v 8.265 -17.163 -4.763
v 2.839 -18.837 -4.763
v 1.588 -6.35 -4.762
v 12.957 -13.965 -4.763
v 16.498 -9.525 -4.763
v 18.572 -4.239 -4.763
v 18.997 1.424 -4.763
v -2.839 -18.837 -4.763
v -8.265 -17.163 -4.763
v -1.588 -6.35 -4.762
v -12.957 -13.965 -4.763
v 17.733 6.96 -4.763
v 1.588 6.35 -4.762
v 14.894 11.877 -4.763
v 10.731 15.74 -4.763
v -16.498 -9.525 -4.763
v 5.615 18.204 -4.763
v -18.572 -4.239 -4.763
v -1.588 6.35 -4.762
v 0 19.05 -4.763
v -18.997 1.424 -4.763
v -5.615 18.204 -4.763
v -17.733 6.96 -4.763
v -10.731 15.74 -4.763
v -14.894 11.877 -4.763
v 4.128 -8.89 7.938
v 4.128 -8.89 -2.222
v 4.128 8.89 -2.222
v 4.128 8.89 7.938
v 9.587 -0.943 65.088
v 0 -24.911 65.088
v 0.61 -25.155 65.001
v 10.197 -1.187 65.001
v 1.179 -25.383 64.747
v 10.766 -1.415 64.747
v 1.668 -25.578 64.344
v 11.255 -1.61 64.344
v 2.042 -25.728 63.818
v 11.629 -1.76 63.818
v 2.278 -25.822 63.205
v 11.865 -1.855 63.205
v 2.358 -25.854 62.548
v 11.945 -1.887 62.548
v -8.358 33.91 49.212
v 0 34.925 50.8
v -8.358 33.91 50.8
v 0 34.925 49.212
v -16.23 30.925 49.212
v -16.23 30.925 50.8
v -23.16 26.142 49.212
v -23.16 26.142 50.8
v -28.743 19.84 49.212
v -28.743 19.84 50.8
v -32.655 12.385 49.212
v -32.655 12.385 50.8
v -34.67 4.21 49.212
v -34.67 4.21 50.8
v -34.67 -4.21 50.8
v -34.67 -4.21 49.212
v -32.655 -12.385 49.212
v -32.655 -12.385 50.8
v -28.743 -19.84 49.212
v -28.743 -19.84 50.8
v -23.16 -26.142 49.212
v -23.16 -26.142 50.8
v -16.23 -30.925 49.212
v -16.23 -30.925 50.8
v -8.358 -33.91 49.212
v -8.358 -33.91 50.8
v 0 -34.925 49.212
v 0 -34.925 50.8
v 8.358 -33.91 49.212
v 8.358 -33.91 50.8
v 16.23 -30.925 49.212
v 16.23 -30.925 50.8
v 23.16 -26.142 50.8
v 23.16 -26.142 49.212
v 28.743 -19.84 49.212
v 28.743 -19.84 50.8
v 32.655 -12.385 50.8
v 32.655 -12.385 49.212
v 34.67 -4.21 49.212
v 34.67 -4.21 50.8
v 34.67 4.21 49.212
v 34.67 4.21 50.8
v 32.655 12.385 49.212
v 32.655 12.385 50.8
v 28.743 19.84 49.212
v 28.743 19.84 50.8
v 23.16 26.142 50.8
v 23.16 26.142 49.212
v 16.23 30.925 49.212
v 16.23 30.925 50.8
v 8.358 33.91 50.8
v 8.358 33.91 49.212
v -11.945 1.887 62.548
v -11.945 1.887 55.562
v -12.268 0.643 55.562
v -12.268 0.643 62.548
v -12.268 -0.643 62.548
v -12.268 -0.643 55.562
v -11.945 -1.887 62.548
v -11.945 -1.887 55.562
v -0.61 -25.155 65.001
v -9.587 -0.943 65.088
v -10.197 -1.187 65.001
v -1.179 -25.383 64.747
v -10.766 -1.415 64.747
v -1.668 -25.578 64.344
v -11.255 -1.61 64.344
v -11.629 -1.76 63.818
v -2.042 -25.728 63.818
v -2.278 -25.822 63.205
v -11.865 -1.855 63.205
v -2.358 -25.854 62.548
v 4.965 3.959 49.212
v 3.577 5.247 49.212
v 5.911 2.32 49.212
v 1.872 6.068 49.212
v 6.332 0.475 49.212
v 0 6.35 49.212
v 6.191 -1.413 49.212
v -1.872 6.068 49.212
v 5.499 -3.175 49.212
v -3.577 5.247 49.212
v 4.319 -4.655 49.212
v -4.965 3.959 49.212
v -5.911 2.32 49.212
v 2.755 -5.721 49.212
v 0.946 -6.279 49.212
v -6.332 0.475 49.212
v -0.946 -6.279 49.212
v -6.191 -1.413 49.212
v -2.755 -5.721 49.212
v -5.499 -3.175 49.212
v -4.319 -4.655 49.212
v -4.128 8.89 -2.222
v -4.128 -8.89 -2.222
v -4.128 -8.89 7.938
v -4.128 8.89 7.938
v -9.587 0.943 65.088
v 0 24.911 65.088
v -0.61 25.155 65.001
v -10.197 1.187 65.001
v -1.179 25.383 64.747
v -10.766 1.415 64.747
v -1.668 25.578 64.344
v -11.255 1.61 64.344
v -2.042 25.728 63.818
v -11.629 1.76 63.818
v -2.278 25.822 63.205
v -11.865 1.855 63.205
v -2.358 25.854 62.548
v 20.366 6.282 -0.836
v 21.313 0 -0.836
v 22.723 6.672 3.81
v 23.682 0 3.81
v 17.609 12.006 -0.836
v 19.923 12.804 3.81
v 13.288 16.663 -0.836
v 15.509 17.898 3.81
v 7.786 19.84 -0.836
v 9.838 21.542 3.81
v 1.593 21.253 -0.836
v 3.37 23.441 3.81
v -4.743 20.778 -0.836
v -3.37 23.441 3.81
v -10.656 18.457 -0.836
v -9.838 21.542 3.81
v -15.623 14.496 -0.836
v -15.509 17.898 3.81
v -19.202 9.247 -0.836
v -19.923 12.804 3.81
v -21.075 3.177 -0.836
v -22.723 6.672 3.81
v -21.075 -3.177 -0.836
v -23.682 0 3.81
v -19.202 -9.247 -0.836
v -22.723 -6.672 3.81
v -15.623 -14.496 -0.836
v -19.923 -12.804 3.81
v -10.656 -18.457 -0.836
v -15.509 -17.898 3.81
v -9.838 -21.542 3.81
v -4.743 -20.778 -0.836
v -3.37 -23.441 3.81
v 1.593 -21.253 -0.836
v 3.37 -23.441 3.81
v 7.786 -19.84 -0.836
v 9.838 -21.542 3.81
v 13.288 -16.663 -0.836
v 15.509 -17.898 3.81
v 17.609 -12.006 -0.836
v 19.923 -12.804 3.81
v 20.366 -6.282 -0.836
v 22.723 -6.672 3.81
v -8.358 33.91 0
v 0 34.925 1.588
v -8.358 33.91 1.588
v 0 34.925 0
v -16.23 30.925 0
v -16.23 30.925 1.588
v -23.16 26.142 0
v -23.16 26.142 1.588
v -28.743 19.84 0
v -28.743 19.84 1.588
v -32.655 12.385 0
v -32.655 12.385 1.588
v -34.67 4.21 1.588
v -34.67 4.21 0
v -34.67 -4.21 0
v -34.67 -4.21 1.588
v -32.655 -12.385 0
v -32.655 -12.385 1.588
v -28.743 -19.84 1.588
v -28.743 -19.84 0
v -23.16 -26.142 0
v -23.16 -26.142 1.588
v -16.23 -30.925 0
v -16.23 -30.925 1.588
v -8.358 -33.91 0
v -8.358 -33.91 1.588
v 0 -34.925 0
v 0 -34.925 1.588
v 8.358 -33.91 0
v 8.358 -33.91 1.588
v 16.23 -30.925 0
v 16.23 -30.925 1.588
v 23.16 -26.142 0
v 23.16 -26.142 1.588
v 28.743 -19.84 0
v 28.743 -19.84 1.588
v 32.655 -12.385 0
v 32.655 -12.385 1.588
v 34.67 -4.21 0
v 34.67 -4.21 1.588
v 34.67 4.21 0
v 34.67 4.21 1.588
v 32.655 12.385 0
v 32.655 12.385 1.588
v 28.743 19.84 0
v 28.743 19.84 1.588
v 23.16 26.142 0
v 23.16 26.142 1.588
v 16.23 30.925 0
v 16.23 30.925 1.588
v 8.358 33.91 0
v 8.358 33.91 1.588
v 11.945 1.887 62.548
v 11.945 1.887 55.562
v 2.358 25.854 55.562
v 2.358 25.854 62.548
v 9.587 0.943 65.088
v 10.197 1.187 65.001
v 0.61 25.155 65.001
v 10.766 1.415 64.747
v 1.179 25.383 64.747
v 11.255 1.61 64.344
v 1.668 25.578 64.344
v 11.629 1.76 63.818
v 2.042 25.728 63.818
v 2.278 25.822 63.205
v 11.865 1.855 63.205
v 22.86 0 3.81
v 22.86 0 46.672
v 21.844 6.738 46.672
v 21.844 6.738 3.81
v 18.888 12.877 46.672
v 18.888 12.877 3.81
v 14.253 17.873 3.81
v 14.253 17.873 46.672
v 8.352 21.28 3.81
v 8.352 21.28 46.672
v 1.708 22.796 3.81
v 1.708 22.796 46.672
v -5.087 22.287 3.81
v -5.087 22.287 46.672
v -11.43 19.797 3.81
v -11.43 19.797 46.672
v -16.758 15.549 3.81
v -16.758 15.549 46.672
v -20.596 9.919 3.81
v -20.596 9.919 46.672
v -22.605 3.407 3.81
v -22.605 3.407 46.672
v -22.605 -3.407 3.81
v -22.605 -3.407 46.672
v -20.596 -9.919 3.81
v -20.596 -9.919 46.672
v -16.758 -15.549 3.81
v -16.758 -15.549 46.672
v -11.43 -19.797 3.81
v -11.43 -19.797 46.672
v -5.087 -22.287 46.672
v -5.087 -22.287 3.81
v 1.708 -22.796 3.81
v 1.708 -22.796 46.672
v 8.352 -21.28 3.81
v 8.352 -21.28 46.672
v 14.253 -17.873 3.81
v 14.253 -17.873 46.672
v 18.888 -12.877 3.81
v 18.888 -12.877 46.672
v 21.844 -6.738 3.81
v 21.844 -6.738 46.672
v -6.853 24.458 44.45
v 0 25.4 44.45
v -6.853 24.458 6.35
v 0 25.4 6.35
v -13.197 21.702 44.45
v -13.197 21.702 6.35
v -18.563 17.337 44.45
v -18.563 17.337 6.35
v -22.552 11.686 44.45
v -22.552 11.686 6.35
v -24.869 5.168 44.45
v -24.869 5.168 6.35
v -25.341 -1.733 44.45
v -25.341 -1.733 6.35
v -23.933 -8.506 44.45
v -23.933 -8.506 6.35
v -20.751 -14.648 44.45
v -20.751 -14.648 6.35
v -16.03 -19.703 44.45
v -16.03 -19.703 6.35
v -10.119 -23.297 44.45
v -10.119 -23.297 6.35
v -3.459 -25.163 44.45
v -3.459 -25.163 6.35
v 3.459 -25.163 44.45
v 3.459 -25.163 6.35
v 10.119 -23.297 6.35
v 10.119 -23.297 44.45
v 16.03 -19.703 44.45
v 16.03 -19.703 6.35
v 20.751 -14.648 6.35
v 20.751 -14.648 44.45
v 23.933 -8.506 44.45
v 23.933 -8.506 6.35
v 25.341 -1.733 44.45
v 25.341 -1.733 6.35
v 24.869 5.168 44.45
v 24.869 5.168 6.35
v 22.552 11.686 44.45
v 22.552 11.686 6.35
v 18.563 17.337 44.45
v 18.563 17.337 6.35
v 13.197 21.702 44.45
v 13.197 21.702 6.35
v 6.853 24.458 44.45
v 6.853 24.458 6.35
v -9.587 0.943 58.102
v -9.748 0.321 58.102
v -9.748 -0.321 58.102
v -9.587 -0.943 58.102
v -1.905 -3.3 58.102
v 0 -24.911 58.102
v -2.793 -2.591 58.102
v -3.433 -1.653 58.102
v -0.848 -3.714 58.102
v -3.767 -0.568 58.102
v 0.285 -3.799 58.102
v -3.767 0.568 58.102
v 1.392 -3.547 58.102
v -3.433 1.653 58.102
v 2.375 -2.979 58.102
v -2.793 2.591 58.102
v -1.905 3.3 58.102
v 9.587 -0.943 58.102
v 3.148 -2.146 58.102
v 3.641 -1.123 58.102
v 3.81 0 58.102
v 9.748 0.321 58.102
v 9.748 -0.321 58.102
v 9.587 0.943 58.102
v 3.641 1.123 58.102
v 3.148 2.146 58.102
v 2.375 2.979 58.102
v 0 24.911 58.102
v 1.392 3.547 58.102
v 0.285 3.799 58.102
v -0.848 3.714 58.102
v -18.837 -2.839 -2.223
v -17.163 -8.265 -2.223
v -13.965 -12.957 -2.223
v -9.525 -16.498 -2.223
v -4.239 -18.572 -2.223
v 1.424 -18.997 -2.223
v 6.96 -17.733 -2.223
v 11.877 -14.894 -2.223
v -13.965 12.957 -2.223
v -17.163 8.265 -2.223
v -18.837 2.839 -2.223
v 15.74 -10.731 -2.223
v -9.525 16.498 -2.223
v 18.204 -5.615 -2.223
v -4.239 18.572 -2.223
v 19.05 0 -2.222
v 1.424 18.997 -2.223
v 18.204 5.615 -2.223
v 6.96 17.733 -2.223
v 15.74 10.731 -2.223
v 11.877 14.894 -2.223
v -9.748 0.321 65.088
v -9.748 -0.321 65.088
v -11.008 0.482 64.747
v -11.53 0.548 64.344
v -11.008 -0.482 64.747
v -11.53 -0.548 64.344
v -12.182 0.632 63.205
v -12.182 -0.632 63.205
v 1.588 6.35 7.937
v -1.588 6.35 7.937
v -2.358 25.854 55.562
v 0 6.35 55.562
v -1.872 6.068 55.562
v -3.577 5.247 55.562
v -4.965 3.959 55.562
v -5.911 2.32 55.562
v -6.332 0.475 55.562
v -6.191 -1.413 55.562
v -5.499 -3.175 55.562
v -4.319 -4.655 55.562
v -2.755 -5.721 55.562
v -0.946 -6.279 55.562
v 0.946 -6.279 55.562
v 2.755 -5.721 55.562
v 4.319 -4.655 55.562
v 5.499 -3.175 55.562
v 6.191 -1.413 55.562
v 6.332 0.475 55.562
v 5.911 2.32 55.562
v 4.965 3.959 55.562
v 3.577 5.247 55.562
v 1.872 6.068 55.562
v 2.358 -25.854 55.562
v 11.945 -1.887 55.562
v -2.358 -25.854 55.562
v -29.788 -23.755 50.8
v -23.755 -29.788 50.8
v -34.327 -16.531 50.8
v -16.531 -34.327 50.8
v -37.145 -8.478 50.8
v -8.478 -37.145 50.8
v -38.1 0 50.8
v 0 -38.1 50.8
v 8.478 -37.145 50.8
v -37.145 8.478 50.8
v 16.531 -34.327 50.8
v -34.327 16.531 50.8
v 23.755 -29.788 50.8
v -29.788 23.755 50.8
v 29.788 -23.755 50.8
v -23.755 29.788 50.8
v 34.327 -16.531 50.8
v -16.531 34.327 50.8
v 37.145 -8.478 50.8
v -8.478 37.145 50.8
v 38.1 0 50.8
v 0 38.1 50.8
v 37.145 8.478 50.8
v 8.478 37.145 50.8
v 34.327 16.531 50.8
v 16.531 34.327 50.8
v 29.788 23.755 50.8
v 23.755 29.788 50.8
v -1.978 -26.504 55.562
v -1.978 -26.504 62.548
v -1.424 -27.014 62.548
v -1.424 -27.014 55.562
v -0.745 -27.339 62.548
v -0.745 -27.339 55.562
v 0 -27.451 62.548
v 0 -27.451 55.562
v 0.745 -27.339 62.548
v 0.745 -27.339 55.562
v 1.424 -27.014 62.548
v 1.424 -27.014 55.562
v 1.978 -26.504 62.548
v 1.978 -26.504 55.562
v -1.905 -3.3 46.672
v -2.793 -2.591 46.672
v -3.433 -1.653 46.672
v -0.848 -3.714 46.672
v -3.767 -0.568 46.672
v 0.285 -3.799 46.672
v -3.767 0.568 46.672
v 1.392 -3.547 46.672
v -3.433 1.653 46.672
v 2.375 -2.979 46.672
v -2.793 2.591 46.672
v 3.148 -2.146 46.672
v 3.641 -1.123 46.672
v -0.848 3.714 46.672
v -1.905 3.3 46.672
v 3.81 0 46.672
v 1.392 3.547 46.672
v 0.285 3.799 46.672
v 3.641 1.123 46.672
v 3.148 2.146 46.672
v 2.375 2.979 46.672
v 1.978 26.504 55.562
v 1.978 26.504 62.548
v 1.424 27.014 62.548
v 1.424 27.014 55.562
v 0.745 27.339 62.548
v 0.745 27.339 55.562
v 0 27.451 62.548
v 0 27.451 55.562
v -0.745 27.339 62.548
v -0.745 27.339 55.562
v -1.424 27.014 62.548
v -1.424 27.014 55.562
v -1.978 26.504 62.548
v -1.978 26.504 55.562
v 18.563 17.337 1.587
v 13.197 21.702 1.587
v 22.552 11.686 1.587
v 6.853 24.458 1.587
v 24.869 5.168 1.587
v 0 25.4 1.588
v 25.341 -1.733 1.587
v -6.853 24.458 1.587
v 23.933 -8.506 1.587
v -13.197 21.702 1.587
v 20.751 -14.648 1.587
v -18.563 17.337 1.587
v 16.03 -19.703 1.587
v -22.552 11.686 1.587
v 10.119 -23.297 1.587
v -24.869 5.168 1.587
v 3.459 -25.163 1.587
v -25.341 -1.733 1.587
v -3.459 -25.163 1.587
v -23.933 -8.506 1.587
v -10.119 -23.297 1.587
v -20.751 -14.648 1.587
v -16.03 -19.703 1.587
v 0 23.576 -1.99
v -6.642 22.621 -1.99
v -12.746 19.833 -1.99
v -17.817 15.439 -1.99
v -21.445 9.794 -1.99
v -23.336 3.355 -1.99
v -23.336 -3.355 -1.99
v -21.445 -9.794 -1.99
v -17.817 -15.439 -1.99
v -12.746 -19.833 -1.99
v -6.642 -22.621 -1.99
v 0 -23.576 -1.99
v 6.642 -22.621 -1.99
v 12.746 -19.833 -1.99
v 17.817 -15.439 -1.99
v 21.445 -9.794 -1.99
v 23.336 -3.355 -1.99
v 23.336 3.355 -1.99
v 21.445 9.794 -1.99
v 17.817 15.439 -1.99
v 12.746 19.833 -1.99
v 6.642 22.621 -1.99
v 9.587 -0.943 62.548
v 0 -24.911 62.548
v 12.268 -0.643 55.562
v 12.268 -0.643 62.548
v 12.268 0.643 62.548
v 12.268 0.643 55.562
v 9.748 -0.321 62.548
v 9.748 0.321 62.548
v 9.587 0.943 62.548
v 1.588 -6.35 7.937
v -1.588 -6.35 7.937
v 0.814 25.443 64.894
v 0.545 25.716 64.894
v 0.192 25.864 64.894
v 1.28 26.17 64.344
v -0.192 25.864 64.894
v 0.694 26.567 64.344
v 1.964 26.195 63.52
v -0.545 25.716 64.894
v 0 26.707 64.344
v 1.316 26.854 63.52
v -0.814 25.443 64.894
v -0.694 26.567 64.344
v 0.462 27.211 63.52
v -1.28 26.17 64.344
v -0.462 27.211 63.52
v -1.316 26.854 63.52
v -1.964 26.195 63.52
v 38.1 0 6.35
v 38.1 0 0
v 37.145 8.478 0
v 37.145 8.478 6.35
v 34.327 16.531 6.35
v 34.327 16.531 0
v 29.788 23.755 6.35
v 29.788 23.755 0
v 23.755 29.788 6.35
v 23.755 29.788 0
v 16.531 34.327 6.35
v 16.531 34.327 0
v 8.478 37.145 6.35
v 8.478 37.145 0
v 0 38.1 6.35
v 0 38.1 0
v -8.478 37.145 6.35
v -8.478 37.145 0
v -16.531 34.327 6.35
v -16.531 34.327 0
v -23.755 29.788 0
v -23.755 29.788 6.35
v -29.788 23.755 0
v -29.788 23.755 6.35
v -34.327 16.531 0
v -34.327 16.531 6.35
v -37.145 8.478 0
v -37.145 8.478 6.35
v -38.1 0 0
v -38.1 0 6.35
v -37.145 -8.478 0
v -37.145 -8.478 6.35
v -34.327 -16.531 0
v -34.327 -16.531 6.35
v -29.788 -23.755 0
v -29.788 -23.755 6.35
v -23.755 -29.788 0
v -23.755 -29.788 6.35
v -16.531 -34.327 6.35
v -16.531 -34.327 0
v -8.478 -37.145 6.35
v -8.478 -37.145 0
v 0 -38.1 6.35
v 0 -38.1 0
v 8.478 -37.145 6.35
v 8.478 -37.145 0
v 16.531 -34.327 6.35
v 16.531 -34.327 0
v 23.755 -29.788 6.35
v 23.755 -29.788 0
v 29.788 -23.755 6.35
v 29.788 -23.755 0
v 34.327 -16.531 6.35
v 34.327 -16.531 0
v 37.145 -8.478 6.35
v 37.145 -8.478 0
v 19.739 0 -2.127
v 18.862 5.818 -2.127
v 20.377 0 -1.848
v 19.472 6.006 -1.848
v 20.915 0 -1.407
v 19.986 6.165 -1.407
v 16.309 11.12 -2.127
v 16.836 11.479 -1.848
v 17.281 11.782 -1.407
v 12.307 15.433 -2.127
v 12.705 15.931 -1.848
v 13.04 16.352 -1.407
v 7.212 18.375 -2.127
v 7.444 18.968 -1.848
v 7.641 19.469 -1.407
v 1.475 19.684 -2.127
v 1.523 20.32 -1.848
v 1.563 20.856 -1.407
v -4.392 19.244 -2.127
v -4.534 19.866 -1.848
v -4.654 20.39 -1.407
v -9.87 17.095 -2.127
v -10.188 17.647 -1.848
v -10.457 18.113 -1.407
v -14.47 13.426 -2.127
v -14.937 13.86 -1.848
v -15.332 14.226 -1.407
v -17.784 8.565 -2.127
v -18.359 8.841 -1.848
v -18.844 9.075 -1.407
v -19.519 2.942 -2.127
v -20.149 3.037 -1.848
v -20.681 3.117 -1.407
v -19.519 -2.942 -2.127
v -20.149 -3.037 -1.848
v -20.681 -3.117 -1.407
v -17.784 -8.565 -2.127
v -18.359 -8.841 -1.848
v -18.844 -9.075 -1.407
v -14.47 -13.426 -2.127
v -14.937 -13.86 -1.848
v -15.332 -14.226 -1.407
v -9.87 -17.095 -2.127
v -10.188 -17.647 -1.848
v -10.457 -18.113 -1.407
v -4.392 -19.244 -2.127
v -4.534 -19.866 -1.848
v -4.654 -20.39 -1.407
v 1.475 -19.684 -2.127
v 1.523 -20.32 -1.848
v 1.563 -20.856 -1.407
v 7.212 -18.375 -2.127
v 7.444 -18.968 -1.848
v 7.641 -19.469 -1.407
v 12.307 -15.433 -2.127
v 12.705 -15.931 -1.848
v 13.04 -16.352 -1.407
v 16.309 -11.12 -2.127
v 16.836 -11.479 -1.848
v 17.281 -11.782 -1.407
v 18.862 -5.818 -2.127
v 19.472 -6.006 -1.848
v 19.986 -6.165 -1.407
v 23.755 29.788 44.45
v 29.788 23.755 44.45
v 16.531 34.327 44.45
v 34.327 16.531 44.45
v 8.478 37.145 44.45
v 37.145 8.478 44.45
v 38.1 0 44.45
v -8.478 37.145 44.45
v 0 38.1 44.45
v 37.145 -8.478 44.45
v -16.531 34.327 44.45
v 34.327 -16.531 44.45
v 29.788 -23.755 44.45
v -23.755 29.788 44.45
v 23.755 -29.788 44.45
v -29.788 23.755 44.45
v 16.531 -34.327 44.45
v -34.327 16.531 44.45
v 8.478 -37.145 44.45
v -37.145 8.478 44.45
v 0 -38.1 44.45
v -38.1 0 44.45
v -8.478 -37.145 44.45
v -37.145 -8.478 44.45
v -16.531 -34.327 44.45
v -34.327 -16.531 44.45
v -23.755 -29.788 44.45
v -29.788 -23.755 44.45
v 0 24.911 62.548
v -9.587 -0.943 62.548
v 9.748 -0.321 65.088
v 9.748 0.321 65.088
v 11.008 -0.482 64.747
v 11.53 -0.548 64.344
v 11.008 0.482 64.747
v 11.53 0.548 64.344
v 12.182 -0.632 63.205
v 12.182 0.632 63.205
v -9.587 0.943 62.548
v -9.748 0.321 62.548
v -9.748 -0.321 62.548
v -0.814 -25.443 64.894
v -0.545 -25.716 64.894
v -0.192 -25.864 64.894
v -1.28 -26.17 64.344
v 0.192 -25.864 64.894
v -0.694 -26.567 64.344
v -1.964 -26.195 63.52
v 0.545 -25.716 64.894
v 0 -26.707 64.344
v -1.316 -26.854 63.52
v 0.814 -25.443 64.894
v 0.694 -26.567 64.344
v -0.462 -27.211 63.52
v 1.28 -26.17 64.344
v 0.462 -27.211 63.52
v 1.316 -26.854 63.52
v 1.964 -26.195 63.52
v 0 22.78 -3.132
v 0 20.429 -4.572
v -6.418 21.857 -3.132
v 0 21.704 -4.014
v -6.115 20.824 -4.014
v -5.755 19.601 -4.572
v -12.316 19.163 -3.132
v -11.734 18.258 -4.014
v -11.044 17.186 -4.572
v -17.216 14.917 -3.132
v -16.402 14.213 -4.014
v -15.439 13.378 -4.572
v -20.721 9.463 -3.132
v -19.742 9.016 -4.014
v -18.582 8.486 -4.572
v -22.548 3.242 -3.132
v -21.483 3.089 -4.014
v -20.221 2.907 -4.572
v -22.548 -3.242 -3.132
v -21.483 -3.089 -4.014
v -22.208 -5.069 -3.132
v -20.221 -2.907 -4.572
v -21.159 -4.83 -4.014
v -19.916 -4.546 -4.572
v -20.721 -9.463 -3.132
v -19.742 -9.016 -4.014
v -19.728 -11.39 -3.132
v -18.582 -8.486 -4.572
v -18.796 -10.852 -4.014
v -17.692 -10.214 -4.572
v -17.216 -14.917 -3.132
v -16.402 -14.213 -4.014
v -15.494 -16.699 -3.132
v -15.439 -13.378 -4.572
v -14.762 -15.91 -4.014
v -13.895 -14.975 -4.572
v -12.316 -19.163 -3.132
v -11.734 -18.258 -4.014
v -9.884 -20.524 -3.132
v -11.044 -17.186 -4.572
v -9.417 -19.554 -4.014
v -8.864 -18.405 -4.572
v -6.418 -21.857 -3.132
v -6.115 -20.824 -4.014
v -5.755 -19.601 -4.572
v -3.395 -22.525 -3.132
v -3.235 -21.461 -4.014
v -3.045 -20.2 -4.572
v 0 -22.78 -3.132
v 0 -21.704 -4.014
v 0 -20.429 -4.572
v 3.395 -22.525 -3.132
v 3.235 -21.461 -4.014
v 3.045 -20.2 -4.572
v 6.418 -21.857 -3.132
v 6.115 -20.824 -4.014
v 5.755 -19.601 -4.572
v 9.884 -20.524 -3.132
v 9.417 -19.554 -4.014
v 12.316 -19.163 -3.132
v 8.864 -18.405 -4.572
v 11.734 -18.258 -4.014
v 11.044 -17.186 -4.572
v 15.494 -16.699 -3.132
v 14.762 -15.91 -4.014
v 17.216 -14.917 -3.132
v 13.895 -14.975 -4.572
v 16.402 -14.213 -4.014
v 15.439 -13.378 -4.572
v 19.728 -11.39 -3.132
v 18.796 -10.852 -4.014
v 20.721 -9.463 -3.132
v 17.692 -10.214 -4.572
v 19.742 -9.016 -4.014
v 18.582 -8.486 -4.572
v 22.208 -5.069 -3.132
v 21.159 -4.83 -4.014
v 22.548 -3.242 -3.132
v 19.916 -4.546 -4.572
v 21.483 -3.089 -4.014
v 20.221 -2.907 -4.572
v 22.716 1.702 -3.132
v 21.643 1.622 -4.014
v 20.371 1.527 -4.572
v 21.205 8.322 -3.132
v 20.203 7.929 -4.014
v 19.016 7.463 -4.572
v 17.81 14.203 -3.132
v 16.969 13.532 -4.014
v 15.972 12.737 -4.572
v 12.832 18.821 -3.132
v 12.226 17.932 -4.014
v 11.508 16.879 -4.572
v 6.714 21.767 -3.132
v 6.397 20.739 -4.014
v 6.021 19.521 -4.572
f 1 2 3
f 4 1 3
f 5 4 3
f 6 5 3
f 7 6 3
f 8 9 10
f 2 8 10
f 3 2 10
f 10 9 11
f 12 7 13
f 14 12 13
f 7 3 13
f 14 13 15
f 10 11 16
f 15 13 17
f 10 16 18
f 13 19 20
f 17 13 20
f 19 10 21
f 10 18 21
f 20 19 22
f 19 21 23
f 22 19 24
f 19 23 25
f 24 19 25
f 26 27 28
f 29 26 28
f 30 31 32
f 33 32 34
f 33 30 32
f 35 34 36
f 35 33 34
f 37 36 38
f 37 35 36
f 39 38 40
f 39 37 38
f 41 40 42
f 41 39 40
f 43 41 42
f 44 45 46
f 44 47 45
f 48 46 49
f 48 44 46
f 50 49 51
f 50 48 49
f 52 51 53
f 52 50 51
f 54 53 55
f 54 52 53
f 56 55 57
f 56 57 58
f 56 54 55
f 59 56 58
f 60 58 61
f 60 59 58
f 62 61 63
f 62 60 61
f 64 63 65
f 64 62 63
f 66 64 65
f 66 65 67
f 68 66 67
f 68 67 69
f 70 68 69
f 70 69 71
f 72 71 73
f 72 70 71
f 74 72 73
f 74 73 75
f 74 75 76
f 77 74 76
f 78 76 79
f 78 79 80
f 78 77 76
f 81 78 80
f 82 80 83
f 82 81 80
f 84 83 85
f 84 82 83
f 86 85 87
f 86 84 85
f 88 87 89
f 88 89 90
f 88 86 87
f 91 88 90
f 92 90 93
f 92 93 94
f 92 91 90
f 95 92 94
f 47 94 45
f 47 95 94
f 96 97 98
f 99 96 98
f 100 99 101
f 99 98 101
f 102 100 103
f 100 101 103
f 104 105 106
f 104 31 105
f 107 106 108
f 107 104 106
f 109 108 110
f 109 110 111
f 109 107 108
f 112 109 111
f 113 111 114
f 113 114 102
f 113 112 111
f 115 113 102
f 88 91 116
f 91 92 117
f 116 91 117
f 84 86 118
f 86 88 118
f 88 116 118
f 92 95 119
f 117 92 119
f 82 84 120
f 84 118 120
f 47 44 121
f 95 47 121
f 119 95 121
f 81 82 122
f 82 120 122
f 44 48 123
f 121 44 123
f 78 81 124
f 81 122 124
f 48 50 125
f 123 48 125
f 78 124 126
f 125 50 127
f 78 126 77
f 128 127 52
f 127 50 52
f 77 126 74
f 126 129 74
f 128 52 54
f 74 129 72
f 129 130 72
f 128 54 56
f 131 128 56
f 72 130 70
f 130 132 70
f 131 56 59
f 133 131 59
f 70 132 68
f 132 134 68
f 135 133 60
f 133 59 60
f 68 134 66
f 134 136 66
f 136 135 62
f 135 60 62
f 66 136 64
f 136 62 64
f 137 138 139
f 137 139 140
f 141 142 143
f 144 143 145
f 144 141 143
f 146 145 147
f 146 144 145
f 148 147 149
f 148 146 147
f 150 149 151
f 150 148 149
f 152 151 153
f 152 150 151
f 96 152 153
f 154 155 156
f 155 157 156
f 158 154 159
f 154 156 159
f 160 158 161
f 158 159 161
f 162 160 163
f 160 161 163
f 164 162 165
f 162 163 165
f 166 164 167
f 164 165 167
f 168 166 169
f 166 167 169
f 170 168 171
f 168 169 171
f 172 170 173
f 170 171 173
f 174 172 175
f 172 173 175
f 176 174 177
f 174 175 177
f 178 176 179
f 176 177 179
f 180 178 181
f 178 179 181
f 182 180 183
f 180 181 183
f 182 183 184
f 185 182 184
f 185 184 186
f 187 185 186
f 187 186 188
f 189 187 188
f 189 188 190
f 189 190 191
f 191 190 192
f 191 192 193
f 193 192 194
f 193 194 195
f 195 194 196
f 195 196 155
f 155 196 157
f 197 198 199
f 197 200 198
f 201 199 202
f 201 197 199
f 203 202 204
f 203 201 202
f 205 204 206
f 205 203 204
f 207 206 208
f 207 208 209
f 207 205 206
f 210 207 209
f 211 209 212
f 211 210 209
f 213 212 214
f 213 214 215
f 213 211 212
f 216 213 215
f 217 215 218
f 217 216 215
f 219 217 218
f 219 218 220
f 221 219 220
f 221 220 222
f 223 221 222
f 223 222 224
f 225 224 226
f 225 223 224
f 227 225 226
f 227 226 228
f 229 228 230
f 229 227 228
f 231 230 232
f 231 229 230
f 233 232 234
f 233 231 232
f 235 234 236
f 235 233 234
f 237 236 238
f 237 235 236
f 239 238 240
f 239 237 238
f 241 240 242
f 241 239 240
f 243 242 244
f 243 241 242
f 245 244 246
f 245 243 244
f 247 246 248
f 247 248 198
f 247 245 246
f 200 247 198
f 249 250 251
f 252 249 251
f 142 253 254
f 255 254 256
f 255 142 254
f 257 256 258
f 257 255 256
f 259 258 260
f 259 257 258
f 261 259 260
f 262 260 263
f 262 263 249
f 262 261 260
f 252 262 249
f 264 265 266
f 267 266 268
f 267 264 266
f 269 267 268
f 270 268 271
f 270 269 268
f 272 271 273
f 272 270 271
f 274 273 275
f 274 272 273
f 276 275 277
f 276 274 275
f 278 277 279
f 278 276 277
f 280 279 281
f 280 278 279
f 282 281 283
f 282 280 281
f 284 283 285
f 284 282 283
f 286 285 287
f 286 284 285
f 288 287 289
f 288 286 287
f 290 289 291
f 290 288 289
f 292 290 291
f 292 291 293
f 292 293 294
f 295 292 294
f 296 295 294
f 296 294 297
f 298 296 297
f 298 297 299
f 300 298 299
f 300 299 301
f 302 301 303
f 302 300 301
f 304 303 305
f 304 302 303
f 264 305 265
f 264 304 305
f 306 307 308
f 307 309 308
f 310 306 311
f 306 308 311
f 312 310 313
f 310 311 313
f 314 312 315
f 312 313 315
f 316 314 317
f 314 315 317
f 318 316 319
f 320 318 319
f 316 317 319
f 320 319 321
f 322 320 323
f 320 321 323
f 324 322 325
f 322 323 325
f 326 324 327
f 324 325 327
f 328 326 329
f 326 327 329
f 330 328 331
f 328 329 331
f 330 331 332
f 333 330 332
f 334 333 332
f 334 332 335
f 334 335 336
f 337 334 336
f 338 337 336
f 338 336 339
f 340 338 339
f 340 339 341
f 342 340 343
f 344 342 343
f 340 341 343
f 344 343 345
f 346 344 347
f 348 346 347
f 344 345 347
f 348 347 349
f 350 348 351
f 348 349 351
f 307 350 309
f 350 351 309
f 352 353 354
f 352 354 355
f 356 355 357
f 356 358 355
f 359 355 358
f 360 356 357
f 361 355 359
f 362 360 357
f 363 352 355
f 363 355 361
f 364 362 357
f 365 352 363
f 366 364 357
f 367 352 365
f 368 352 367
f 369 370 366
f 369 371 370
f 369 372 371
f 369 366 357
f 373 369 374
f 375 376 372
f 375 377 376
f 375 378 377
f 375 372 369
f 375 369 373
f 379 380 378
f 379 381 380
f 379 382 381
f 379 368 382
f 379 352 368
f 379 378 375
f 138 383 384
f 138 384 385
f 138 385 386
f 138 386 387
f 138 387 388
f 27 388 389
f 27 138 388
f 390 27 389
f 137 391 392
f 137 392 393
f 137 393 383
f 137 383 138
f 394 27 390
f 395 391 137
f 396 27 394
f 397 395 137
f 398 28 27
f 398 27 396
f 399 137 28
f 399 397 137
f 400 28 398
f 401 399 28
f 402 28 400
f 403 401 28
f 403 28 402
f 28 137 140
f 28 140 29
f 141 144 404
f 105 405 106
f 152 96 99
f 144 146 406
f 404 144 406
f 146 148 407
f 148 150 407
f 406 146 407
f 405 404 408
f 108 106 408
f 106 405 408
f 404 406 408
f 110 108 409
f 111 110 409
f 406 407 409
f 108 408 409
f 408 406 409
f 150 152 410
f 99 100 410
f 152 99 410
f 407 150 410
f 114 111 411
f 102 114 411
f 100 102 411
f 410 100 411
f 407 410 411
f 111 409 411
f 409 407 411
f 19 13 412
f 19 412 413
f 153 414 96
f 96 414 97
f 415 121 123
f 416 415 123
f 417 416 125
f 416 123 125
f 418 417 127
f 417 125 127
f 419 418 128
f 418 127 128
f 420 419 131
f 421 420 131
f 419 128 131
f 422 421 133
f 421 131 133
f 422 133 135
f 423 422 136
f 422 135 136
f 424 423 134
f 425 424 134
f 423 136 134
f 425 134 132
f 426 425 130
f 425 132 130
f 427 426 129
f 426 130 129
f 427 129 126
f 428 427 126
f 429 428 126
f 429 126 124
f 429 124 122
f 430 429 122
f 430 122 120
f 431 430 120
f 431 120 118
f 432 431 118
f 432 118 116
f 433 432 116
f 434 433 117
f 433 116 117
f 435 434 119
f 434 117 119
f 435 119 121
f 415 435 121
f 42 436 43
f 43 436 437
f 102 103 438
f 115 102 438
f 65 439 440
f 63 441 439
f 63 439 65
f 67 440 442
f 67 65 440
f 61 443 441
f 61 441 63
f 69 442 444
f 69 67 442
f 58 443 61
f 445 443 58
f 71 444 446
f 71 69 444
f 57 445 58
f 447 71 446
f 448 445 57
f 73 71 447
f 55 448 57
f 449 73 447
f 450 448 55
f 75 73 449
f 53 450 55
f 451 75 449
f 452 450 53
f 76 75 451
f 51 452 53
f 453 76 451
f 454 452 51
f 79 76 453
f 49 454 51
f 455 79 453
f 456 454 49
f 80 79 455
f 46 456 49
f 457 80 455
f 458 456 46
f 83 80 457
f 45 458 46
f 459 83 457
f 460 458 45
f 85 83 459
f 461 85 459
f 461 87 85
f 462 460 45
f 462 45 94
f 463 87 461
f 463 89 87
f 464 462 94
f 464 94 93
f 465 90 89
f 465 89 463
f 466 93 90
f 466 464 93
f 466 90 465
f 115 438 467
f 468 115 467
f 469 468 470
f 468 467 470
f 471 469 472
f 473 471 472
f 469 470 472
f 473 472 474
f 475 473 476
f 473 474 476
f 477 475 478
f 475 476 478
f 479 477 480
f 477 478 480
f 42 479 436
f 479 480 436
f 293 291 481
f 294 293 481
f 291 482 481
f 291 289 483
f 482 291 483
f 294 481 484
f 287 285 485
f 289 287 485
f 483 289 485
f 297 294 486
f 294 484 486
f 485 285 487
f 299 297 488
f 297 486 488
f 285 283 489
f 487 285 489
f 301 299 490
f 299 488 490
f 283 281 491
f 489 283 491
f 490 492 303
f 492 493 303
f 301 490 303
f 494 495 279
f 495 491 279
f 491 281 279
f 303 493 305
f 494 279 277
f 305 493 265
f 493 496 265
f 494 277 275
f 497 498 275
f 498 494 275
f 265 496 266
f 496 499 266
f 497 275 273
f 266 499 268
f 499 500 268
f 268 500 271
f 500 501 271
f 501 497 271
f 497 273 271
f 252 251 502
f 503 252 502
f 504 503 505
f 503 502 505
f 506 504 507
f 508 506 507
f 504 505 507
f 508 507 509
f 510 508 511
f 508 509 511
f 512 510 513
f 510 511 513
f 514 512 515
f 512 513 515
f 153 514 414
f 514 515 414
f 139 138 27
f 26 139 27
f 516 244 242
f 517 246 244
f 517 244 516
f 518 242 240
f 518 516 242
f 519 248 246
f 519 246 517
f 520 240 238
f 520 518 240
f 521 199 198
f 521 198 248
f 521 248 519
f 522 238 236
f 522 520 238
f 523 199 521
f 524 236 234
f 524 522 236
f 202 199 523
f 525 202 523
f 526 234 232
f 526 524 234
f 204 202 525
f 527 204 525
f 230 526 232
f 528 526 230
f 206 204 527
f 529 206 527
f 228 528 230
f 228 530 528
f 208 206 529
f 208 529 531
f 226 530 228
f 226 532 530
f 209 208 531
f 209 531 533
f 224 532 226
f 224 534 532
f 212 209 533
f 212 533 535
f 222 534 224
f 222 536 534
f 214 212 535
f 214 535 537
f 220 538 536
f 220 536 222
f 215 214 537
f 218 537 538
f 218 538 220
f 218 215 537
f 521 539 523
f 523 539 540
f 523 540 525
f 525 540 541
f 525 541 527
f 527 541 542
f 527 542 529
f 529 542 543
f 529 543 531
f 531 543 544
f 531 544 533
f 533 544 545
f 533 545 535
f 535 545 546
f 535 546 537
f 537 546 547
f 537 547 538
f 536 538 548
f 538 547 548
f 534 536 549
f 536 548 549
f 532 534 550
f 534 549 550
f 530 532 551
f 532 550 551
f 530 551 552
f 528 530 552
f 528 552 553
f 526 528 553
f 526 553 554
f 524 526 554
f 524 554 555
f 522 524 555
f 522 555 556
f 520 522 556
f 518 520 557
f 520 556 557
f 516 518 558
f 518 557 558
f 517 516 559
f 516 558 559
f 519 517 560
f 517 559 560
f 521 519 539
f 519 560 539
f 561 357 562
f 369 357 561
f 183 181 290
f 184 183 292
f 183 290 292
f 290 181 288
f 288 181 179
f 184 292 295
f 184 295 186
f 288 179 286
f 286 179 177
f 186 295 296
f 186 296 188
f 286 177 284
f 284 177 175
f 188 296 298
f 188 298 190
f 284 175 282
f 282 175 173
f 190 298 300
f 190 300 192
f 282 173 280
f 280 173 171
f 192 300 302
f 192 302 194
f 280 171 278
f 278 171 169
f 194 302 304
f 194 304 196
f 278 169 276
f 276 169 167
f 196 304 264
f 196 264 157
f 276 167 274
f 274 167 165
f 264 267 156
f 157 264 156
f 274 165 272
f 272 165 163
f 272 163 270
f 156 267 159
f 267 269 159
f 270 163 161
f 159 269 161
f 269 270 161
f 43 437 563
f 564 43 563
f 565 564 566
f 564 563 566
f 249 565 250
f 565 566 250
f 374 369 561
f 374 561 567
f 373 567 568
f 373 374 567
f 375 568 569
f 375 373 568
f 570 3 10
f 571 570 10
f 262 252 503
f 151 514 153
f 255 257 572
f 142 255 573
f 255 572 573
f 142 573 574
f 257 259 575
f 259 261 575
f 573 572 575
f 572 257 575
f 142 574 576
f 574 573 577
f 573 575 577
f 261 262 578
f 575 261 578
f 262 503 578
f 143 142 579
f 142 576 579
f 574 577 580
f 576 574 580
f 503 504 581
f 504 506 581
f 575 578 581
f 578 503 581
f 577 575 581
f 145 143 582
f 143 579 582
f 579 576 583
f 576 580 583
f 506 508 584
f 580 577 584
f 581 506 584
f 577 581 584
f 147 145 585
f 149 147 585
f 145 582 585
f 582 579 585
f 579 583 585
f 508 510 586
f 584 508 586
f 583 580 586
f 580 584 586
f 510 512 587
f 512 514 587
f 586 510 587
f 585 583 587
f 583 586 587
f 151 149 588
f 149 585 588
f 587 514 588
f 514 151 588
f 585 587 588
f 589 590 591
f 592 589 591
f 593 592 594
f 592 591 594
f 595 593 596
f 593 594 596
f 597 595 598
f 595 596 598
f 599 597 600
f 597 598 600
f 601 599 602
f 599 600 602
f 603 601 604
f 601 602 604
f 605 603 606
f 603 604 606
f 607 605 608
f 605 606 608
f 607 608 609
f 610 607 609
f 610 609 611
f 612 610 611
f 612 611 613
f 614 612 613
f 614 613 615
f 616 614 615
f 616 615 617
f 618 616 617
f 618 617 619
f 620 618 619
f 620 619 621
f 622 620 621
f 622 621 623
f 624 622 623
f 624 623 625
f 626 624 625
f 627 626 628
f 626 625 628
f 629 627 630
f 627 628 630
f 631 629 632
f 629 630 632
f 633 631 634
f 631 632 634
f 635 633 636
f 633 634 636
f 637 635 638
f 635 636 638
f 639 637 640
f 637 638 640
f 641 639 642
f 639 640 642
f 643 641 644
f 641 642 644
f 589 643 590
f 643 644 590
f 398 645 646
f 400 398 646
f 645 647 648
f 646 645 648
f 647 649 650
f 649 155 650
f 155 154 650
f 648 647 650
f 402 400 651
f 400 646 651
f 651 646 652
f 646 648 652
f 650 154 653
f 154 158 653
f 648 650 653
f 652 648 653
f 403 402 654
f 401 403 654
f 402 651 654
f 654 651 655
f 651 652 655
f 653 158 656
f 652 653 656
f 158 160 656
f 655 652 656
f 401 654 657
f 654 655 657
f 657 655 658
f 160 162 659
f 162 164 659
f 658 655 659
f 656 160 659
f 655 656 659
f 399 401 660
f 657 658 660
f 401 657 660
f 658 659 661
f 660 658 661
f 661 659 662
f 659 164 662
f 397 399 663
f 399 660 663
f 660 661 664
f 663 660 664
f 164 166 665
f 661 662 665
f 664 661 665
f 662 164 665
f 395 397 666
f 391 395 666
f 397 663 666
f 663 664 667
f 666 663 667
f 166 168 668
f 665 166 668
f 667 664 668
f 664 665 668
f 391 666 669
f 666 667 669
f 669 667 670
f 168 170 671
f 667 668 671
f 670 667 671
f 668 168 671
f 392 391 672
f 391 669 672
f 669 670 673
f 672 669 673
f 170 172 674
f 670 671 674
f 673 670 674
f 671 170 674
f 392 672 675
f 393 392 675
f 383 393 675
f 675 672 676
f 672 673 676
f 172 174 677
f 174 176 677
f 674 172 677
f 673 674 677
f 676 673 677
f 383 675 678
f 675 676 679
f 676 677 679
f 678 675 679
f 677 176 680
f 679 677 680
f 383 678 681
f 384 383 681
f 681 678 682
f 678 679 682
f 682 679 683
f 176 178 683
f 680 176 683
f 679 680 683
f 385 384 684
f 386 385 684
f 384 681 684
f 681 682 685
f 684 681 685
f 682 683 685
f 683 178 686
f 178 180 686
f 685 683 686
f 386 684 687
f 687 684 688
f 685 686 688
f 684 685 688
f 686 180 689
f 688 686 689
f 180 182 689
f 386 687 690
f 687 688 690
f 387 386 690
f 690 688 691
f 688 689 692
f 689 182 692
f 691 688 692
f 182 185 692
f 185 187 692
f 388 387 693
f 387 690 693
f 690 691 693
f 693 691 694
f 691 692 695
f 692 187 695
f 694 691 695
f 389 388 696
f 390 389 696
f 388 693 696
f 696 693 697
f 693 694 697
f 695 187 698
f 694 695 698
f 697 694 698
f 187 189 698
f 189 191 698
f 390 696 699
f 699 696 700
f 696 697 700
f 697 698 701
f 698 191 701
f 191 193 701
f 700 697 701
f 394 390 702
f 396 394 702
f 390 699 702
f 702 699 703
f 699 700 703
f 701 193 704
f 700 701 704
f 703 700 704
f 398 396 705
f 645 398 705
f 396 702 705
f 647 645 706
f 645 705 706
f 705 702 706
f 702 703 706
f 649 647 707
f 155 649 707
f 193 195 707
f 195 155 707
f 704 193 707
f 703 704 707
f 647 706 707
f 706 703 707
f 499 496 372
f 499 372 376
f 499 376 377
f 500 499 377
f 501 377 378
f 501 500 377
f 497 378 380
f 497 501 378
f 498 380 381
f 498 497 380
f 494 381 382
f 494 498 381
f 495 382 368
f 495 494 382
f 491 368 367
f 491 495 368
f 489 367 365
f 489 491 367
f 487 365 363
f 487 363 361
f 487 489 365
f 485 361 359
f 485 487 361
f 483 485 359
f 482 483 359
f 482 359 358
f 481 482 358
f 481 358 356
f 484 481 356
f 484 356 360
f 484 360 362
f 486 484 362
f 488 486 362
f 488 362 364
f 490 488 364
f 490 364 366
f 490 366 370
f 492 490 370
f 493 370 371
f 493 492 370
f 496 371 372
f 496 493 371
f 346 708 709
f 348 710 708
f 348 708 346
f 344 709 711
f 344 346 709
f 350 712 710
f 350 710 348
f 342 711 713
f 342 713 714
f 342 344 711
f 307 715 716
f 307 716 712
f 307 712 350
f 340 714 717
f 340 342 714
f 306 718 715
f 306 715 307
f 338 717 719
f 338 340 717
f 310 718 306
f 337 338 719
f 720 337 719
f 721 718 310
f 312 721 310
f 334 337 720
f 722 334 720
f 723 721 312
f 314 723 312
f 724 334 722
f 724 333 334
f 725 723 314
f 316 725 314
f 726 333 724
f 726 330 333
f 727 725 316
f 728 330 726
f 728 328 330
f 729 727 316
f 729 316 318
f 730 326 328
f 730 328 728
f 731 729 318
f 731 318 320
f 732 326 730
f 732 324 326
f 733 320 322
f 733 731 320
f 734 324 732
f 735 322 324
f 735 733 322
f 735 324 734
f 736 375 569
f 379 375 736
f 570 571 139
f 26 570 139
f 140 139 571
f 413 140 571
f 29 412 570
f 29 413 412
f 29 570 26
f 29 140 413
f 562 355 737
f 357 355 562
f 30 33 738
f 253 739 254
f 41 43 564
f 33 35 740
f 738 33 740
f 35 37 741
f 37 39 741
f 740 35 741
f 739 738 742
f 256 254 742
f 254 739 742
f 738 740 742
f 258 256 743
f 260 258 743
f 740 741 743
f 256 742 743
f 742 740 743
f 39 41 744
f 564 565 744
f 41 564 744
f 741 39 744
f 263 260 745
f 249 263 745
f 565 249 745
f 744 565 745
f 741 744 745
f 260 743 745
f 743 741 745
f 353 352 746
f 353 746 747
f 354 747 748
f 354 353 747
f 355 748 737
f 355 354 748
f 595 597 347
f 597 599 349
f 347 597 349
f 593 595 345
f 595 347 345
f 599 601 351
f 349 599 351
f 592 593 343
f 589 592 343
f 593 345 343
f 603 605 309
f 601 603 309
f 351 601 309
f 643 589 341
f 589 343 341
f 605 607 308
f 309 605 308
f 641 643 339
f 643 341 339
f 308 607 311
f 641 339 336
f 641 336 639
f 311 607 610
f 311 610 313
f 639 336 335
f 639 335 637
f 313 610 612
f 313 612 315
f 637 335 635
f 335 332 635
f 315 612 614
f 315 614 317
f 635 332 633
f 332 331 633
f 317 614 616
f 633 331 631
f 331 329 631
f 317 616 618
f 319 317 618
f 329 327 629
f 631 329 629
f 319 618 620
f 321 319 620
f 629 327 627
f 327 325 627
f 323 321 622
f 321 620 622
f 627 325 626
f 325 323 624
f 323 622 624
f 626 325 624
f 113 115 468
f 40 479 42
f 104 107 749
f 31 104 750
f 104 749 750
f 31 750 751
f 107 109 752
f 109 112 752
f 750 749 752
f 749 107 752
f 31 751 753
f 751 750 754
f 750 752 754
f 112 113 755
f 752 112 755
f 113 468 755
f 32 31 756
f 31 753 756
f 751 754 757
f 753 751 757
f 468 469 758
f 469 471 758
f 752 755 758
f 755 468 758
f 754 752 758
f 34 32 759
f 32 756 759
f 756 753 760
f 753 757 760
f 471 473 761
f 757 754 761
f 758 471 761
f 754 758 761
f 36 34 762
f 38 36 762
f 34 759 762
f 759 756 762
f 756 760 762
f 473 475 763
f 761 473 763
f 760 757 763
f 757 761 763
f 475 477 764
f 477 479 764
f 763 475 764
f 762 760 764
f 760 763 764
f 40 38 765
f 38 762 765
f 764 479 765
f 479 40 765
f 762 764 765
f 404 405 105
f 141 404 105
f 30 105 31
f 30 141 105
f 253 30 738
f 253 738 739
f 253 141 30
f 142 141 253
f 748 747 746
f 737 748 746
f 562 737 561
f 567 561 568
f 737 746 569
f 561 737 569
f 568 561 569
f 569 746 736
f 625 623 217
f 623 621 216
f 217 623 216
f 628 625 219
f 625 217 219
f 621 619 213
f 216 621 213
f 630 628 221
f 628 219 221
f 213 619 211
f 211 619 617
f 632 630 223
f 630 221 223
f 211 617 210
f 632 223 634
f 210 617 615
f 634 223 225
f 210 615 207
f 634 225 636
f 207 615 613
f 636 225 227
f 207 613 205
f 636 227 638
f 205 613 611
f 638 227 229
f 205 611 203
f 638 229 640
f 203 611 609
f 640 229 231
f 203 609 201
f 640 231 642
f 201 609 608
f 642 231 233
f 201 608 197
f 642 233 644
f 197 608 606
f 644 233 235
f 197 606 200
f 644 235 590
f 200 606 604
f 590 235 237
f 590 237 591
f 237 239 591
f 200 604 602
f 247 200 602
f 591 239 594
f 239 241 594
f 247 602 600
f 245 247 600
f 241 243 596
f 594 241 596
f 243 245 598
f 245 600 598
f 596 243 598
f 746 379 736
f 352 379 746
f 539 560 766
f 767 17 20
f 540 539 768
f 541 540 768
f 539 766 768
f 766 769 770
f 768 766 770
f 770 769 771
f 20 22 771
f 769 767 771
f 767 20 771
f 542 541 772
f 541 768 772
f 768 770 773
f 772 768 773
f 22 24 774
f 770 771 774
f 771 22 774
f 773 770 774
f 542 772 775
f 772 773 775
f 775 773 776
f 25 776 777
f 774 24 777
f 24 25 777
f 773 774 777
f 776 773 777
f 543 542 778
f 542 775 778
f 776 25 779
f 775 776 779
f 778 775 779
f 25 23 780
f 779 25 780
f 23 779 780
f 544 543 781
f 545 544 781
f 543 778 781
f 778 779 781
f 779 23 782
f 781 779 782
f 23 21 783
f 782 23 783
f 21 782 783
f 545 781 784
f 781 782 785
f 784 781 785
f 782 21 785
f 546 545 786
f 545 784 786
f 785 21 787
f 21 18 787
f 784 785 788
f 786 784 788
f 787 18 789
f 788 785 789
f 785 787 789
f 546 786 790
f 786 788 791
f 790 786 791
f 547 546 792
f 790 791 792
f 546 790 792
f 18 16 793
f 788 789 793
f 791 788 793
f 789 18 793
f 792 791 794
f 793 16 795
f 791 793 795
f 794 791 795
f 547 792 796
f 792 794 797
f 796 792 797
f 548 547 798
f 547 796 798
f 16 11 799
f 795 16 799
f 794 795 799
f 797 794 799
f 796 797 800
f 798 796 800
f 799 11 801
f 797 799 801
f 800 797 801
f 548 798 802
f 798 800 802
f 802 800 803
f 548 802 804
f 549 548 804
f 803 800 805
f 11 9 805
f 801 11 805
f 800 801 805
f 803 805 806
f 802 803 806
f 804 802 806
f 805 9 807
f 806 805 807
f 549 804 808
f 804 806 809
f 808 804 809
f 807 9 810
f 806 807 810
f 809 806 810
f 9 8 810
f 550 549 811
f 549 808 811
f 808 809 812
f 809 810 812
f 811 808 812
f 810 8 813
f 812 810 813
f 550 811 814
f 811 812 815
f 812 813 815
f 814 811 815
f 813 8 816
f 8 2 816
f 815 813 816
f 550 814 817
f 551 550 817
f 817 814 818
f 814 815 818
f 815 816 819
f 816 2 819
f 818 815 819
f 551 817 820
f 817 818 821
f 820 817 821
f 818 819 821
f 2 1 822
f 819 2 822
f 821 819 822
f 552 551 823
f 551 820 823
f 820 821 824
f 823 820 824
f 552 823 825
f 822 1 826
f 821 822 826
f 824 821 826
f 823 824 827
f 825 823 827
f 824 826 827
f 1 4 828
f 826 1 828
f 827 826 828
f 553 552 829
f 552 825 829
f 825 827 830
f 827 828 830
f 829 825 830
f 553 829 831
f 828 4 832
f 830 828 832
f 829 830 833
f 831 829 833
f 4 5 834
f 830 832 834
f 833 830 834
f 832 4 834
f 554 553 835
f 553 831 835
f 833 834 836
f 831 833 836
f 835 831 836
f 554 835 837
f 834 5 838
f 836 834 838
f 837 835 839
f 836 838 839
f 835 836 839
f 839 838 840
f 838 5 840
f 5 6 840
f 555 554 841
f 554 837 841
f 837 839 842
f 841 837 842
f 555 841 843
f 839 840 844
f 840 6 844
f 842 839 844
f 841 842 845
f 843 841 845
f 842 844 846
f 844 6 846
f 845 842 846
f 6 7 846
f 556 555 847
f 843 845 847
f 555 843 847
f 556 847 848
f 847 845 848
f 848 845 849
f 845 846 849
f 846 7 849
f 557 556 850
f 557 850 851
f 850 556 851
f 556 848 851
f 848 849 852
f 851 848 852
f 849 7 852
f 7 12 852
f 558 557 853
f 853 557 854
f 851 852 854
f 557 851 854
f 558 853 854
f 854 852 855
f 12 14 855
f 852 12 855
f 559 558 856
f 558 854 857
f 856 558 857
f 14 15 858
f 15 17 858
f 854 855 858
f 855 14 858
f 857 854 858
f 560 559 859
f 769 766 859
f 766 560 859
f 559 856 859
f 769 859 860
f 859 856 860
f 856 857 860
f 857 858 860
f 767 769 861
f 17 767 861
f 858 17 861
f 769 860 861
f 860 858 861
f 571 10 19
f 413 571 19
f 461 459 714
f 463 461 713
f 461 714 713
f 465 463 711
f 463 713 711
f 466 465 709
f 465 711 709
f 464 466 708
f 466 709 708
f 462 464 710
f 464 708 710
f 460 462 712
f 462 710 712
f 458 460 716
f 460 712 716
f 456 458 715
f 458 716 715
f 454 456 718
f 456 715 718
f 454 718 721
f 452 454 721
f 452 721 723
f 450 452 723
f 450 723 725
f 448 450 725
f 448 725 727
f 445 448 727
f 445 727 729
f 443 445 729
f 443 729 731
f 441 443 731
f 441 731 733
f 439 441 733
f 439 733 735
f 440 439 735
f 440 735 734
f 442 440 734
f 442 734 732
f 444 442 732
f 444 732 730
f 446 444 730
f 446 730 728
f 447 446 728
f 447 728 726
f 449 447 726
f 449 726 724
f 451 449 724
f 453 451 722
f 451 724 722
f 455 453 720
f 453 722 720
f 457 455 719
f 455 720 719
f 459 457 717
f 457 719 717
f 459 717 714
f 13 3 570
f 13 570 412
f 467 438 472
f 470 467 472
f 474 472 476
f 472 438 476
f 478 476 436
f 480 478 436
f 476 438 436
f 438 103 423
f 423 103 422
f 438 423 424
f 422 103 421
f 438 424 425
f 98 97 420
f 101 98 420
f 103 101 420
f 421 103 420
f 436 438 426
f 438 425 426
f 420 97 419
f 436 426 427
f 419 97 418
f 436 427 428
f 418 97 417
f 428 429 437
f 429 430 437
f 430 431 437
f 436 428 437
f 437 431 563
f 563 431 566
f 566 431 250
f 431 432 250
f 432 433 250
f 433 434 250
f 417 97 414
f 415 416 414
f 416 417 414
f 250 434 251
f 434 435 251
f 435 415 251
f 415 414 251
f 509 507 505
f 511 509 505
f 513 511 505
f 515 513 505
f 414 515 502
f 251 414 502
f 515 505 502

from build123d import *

# Parameters (mm, degrees)
SKETCH1_R           = 38.1
BOSS_EXTRUDE1_DEPTH = 50.8
SKETCH2_W           = 38.1
SKETCH2_H           = 12.7
SKETCH2_W_2         = 1.5875
SKETCH2_H_2         = 34.925
SKETCH4_R           = 6.35
BOSS_EXTRUDE2_DEPTH = 6.35
BOSS_EXTRUDE3_DEPTH = 9.525
FILLET1_R           = 2.54
SKETCH6_W           = 3.175
SKETCH6_H           = 12.7
CUT_EXTRUDE1_DEPTH  = 12.7
SHELL1_START        = 3.81
SHELL1_OUTLINE_R    = 22.86
SHELL1_OUTLINE_W    = 8.255
SHELL1_OUTLINE_H    = 17.78
SHELL1_DEPTH        = 42.8625
SHELL1_START_2      = 7.9375
SHELL1_2_OUTLINE_W  = 8.255
SHELL1_2_OUTLINE_H  = 17.78
SHELL1_2_DEPTH      = 38.735
SHELL1_START_3      = 58.1025
SHELL1_3_DEPTH      = 4.445
SHELL1_START_4      = 46.6725
SHELL1_4_OUTLINE_R  = 3.81
SHELL1_4_DEPTH      = 11.43
SHELL1_START_5      = -2.2225
SHELL1_6_OUTLINE_R  = 19.05
SHELL1_6_OUTLINE_W  = 8.255
SHELL1_6_OUTLINE_H  = 17.78
SHELL1_6_DEPTH      = 6.0325


with BuildPart() as part:
    # Sketch1 → Boss-Extrude1 (new body)
    with BuildSketch(Plane.XY):
        Circle(SKETCH1_R)
    extrude(amount=BOSS_EXTRUDE1_DEPTH)

    # Sketch2 → Cut-Revolve1 (revolve, cut)
    with BuildSketch(Plane(origin=(0, 0, 0), x_dir=(0, 0, -1), z_dir=(1, 0, 0))):
        with Locations((-25.4, 31.75)):
            Rectangle(SKETCH2_W, SKETCH2_H)
        with Locations((-0.79375, 17.4625)):
            Rectangle(SKETCH2_W_2, SKETCH2_H_2)
        with Locations((-50.00625, 17.4625)):
            Rectangle(SKETCH2_W_2, SKETCH2_H_2)
    revolve(axis=Axis((0, 0, 0), (0, 0, 1)), mode=Mode.SUBTRACT)

    # Sketch3 → Revolve1 (revolve)
    with BuildSketch(Plane(origin=(0, 0, 0), x_dir=(0, 0, -1), z_dir=(1, 0, 0))):
        with BuildLine():
            Line((4.7625, 19.05), (4.7625, 0))
            Line((4.7625, 0), (-1.5875, 0))
            Line((-1.5875, 0), (-1.5875, 25.4))
            Line((-1.5875, 25.4), (1.99026356, 23.575552712))
            ThreePointArc((1.99026356, 23.575552712), (4.014349425, 21.703578821), (4.7625, 19.05))
        make_face()
    revolve(axis=Axis((0, 0, -4.7625), (0, 0, 1)))

    # Sketch4 → Boss-Extrude2 (add)
    with BuildSketch(Plane.XY.offset(49.2125)):
        with Locations(Location((0, 0, 0), (0, 0, 90))):
            Circle(SKETCH4_R)
    extrude(amount=BOSS_EXTRUDE2_DEPTH)

    # Sketch5 → Boss-Extrude3 (add)
    with BuildSketch(Plane.XY.offset(55.5625)):
        with BuildLine():
            Line((-2.358330795, 25.854173013), (-11.945334146, 1.886664636))
            ThreePointArc((-11.945334146, 1.886664636), (-12.308672556, 0), (-11.945334146, -1.886664636))
            Line((-11.945334146, -1.886664636), (-2.358330795, -25.854173013))
            ThreePointArc((-2.358330795, -25.854173013), (0, -27.450840695), (2.358330795, -25.854173013))
            Line((2.358330795, -25.854173013), (11.945334146, -1.886664636))
            ThreePointArc((11.945334146, -1.886664636), (12.308672556, 0), (11.945334146, 1.886664636))
            Line((11.945334146, 1.886664636), (2.358330795, 25.854173013))
            ThreePointArc((2.358330795, 25.854173013), (0, 27.450840695), (-2.358330795, 25.854173013))
        make_face()
    extrude(amount=BOSS_EXTRUDE3_DEPTH)

    # Fillet1
    fillet1_edges = [part.edges().sort_by_distance(p)[0] for p in [
        (0, -27.450840695, 65.0875),
        (7.15183247, -13.870418824, 65.0875),
        (12.308672556, 0, 65.0875),
        (7.15183247, 13.870418824, 65.0875),
        (0, 27.450840695, 65.0875),
        (-7.15183247, 13.870418824, 65.0875),
        (-12.308672556, 0, 65.0875),
        (-7.15183247, -13.870418824, 65.0875),
    ]]
    fillet(fillet1_edges, radius=FILLET1_R)

    # Sketch6 → Cut-Extrude1 (cut)
    with BuildSketch(Plane(origin=(0, 0, -4.7625), x_dir=(-1, 0, 0), z_dir=(0, 0, -1))):
        Rectangle(SKETCH6_W, SKETCH6_H)
    extrude(amount=-CUT_EXTRUDE1_DEPTH, mode=Mode.SUBTRACT)

    # Shell1: read off the stored shape, not the designer's step
    # Shell1 outline → Shell1 (cut)
    with BuildSketch(Plane.XY.offset(SHELL1_START)):
        Circle(SHELL1_OUTLINE_R)
        Rectangle(SHELL1_OUTLINE_W, SHELL1_OUTLINE_H, mode=Mode.SUBTRACT)
    extrude(amount=SHELL1_DEPTH, mode=Mode.SUBTRACT)

    # Shell1 2 outline → Shell1 2 (cut)
    with BuildSketch(Plane.XY.offset(SHELL1_START_2)):
        Rectangle(SHELL1_2_OUTLINE_W, SHELL1_2_OUTLINE_H)
    extrude(amount=SHELL1_2_DEPTH, mode=Mode.SUBTRACT)

    # Shell1 3 outline → Shell1 3 (cut)
    with BuildSketch(Plane.XY.offset(SHELL1_START_3)):
        with BuildLine():
            Line((9.587003351, 0.943332318), (0, 24.910840695))
            Line((0, 24.910840695), (-9.587003351, 0.943332318))
            ThreePointArc((-9.587003351, 0.943332318), (-9.768672556, 0), (-9.587003351, -0.943332318))
            Line((-9.587003351, -0.943332318), (0, -24.910840695))
            Line((0, -24.910840695), (9.587003351, -0.943332318))
            ThreePointArc((9.587003351, -0.943332318), (9.768672556, 0), (9.587003351, 0.943332318))
        make_face()
    extrude(amount=SHELL1_3_DEPTH, mode=Mode.SUBTRACT)

    # Shell1 4 outline → Shell1 4 (cut)
    with BuildSketch(Plane.XY.offset(SHELL1_START_4)):
        Circle(SHELL1_4_OUTLINE_R)
    extrude(amount=SHELL1_4_DEPTH, mode=Mode.SUBTRACT)

    # Shell1 5 outline → Shell1 5 (revolve, cut)
    with BuildSketch(Plane.XZ):
        with BuildLine():
            ThreePointArc((19.05, -2.2225), (20.37678941, -1.848424713), (21.312776356, -0.83638178))
            Line((21.312776356, -0.83638178), (23.682155577, 3.81))
            Line((23.682155577, 3.81), (19.05, 3.81))
            Line((19.05, 3.81), (19.05, -2.2225))
        make_face()
    revolve(axis=Axis((0, 0, 0), (0, 0, 1)), mode=Mode.SUBTRACT)

    # Shell1 6 outline → Shell1 6 (cut)
    with BuildSketch(Plane.XY.offset(SHELL1_START_5)):
        Circle(SHELL1_6_OUTLINE_R)
        Rectangle(SHELL1_6_OUTLINE_W, SHELL1_6_OUTLINE_H, mode=Mode.SUBTRACT)
    extrude(amount=SHELL1_6_DEPTH, mode=Mode.SUBTRACT)


solid = part.part
